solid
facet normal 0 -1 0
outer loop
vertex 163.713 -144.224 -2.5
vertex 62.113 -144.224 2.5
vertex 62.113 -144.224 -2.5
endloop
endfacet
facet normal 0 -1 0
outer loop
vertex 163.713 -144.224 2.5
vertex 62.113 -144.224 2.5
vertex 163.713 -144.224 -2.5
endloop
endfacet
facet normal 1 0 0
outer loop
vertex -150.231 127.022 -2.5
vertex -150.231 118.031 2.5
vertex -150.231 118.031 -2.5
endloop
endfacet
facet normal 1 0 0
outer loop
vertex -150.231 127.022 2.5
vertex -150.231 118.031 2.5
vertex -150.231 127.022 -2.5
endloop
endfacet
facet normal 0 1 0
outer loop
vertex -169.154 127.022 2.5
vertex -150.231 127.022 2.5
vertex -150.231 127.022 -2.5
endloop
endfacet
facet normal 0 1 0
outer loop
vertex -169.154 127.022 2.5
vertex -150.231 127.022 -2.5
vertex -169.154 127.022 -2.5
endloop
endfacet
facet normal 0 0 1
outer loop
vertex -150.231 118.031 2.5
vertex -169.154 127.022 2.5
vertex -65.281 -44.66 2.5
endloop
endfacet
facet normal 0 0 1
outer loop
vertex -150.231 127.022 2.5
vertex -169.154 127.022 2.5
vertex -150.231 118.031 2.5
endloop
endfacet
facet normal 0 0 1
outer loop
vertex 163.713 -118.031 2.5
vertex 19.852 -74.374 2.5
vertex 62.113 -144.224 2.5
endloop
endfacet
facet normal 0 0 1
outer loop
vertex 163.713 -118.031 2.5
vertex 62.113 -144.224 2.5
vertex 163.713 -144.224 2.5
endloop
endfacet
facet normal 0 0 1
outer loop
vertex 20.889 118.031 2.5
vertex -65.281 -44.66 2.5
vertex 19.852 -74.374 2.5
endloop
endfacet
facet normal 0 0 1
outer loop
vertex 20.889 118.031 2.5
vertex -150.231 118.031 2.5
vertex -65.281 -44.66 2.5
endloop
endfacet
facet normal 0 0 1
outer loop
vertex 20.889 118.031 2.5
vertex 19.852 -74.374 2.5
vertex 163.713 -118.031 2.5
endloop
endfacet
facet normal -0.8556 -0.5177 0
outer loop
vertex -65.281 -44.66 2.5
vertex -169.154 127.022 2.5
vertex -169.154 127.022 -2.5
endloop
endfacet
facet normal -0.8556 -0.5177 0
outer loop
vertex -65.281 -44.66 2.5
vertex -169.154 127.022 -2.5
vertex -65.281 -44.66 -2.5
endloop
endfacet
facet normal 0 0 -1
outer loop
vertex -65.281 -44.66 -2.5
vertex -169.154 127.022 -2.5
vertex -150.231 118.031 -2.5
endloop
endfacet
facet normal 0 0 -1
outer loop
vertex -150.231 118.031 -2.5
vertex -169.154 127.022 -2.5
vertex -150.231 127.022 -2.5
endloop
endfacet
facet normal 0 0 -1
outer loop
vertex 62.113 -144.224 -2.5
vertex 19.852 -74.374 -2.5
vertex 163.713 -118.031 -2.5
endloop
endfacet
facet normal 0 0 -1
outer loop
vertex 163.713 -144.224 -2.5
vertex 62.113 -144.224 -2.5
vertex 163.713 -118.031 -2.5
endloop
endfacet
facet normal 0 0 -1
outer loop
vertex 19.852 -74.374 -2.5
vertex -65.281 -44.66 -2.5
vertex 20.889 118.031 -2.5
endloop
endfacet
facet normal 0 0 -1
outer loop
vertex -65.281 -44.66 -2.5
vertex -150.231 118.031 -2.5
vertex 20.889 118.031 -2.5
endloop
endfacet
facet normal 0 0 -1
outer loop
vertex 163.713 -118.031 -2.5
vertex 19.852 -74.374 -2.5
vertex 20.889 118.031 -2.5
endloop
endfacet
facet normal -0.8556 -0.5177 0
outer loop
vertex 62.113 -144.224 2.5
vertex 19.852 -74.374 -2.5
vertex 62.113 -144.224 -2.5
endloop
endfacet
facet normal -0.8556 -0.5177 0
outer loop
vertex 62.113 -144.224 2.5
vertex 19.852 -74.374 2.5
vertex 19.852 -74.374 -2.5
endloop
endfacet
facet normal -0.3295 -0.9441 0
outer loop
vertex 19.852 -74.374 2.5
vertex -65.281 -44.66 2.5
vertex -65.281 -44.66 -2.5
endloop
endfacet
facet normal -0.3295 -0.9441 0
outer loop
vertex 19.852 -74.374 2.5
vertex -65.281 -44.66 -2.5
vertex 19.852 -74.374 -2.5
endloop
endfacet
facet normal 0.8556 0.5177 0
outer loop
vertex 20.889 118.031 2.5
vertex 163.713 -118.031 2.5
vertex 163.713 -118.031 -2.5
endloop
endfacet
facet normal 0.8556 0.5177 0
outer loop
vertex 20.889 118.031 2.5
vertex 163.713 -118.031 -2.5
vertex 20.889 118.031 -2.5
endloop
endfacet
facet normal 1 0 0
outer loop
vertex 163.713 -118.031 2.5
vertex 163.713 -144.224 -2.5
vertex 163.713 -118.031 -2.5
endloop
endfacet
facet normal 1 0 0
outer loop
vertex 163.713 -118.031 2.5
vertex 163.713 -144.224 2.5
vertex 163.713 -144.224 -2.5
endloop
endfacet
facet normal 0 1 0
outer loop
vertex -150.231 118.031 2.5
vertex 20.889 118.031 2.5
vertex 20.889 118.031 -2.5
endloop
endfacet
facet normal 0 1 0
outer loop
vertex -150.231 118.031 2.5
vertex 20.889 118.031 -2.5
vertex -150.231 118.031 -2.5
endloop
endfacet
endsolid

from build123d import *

# Parameters (mm, degrees)
BOSS_EXTRUDE1_DEPTH = 2.5


with BuildPart() as part:
    # Sketch1 → Boss-Extrude1 (new, symmetric)
    with BuildSketch(Plane.XY):
        Polygon((163.713404947, -144.224375), (163.713404947, -118.030625), (20.889204947, 118.030625), (-150.230595053, 118.030625), (-150.230595053, 127.022225), (-169.153595053, 127.022225), (-65.280574469, -44.660130514), (19.852041127, -74.374375), (62.113404947, -144.224375), align=None)
    extrude(amount=BOSS_EXTRUDE1_DEPTH, both=True)


solid = part.part
